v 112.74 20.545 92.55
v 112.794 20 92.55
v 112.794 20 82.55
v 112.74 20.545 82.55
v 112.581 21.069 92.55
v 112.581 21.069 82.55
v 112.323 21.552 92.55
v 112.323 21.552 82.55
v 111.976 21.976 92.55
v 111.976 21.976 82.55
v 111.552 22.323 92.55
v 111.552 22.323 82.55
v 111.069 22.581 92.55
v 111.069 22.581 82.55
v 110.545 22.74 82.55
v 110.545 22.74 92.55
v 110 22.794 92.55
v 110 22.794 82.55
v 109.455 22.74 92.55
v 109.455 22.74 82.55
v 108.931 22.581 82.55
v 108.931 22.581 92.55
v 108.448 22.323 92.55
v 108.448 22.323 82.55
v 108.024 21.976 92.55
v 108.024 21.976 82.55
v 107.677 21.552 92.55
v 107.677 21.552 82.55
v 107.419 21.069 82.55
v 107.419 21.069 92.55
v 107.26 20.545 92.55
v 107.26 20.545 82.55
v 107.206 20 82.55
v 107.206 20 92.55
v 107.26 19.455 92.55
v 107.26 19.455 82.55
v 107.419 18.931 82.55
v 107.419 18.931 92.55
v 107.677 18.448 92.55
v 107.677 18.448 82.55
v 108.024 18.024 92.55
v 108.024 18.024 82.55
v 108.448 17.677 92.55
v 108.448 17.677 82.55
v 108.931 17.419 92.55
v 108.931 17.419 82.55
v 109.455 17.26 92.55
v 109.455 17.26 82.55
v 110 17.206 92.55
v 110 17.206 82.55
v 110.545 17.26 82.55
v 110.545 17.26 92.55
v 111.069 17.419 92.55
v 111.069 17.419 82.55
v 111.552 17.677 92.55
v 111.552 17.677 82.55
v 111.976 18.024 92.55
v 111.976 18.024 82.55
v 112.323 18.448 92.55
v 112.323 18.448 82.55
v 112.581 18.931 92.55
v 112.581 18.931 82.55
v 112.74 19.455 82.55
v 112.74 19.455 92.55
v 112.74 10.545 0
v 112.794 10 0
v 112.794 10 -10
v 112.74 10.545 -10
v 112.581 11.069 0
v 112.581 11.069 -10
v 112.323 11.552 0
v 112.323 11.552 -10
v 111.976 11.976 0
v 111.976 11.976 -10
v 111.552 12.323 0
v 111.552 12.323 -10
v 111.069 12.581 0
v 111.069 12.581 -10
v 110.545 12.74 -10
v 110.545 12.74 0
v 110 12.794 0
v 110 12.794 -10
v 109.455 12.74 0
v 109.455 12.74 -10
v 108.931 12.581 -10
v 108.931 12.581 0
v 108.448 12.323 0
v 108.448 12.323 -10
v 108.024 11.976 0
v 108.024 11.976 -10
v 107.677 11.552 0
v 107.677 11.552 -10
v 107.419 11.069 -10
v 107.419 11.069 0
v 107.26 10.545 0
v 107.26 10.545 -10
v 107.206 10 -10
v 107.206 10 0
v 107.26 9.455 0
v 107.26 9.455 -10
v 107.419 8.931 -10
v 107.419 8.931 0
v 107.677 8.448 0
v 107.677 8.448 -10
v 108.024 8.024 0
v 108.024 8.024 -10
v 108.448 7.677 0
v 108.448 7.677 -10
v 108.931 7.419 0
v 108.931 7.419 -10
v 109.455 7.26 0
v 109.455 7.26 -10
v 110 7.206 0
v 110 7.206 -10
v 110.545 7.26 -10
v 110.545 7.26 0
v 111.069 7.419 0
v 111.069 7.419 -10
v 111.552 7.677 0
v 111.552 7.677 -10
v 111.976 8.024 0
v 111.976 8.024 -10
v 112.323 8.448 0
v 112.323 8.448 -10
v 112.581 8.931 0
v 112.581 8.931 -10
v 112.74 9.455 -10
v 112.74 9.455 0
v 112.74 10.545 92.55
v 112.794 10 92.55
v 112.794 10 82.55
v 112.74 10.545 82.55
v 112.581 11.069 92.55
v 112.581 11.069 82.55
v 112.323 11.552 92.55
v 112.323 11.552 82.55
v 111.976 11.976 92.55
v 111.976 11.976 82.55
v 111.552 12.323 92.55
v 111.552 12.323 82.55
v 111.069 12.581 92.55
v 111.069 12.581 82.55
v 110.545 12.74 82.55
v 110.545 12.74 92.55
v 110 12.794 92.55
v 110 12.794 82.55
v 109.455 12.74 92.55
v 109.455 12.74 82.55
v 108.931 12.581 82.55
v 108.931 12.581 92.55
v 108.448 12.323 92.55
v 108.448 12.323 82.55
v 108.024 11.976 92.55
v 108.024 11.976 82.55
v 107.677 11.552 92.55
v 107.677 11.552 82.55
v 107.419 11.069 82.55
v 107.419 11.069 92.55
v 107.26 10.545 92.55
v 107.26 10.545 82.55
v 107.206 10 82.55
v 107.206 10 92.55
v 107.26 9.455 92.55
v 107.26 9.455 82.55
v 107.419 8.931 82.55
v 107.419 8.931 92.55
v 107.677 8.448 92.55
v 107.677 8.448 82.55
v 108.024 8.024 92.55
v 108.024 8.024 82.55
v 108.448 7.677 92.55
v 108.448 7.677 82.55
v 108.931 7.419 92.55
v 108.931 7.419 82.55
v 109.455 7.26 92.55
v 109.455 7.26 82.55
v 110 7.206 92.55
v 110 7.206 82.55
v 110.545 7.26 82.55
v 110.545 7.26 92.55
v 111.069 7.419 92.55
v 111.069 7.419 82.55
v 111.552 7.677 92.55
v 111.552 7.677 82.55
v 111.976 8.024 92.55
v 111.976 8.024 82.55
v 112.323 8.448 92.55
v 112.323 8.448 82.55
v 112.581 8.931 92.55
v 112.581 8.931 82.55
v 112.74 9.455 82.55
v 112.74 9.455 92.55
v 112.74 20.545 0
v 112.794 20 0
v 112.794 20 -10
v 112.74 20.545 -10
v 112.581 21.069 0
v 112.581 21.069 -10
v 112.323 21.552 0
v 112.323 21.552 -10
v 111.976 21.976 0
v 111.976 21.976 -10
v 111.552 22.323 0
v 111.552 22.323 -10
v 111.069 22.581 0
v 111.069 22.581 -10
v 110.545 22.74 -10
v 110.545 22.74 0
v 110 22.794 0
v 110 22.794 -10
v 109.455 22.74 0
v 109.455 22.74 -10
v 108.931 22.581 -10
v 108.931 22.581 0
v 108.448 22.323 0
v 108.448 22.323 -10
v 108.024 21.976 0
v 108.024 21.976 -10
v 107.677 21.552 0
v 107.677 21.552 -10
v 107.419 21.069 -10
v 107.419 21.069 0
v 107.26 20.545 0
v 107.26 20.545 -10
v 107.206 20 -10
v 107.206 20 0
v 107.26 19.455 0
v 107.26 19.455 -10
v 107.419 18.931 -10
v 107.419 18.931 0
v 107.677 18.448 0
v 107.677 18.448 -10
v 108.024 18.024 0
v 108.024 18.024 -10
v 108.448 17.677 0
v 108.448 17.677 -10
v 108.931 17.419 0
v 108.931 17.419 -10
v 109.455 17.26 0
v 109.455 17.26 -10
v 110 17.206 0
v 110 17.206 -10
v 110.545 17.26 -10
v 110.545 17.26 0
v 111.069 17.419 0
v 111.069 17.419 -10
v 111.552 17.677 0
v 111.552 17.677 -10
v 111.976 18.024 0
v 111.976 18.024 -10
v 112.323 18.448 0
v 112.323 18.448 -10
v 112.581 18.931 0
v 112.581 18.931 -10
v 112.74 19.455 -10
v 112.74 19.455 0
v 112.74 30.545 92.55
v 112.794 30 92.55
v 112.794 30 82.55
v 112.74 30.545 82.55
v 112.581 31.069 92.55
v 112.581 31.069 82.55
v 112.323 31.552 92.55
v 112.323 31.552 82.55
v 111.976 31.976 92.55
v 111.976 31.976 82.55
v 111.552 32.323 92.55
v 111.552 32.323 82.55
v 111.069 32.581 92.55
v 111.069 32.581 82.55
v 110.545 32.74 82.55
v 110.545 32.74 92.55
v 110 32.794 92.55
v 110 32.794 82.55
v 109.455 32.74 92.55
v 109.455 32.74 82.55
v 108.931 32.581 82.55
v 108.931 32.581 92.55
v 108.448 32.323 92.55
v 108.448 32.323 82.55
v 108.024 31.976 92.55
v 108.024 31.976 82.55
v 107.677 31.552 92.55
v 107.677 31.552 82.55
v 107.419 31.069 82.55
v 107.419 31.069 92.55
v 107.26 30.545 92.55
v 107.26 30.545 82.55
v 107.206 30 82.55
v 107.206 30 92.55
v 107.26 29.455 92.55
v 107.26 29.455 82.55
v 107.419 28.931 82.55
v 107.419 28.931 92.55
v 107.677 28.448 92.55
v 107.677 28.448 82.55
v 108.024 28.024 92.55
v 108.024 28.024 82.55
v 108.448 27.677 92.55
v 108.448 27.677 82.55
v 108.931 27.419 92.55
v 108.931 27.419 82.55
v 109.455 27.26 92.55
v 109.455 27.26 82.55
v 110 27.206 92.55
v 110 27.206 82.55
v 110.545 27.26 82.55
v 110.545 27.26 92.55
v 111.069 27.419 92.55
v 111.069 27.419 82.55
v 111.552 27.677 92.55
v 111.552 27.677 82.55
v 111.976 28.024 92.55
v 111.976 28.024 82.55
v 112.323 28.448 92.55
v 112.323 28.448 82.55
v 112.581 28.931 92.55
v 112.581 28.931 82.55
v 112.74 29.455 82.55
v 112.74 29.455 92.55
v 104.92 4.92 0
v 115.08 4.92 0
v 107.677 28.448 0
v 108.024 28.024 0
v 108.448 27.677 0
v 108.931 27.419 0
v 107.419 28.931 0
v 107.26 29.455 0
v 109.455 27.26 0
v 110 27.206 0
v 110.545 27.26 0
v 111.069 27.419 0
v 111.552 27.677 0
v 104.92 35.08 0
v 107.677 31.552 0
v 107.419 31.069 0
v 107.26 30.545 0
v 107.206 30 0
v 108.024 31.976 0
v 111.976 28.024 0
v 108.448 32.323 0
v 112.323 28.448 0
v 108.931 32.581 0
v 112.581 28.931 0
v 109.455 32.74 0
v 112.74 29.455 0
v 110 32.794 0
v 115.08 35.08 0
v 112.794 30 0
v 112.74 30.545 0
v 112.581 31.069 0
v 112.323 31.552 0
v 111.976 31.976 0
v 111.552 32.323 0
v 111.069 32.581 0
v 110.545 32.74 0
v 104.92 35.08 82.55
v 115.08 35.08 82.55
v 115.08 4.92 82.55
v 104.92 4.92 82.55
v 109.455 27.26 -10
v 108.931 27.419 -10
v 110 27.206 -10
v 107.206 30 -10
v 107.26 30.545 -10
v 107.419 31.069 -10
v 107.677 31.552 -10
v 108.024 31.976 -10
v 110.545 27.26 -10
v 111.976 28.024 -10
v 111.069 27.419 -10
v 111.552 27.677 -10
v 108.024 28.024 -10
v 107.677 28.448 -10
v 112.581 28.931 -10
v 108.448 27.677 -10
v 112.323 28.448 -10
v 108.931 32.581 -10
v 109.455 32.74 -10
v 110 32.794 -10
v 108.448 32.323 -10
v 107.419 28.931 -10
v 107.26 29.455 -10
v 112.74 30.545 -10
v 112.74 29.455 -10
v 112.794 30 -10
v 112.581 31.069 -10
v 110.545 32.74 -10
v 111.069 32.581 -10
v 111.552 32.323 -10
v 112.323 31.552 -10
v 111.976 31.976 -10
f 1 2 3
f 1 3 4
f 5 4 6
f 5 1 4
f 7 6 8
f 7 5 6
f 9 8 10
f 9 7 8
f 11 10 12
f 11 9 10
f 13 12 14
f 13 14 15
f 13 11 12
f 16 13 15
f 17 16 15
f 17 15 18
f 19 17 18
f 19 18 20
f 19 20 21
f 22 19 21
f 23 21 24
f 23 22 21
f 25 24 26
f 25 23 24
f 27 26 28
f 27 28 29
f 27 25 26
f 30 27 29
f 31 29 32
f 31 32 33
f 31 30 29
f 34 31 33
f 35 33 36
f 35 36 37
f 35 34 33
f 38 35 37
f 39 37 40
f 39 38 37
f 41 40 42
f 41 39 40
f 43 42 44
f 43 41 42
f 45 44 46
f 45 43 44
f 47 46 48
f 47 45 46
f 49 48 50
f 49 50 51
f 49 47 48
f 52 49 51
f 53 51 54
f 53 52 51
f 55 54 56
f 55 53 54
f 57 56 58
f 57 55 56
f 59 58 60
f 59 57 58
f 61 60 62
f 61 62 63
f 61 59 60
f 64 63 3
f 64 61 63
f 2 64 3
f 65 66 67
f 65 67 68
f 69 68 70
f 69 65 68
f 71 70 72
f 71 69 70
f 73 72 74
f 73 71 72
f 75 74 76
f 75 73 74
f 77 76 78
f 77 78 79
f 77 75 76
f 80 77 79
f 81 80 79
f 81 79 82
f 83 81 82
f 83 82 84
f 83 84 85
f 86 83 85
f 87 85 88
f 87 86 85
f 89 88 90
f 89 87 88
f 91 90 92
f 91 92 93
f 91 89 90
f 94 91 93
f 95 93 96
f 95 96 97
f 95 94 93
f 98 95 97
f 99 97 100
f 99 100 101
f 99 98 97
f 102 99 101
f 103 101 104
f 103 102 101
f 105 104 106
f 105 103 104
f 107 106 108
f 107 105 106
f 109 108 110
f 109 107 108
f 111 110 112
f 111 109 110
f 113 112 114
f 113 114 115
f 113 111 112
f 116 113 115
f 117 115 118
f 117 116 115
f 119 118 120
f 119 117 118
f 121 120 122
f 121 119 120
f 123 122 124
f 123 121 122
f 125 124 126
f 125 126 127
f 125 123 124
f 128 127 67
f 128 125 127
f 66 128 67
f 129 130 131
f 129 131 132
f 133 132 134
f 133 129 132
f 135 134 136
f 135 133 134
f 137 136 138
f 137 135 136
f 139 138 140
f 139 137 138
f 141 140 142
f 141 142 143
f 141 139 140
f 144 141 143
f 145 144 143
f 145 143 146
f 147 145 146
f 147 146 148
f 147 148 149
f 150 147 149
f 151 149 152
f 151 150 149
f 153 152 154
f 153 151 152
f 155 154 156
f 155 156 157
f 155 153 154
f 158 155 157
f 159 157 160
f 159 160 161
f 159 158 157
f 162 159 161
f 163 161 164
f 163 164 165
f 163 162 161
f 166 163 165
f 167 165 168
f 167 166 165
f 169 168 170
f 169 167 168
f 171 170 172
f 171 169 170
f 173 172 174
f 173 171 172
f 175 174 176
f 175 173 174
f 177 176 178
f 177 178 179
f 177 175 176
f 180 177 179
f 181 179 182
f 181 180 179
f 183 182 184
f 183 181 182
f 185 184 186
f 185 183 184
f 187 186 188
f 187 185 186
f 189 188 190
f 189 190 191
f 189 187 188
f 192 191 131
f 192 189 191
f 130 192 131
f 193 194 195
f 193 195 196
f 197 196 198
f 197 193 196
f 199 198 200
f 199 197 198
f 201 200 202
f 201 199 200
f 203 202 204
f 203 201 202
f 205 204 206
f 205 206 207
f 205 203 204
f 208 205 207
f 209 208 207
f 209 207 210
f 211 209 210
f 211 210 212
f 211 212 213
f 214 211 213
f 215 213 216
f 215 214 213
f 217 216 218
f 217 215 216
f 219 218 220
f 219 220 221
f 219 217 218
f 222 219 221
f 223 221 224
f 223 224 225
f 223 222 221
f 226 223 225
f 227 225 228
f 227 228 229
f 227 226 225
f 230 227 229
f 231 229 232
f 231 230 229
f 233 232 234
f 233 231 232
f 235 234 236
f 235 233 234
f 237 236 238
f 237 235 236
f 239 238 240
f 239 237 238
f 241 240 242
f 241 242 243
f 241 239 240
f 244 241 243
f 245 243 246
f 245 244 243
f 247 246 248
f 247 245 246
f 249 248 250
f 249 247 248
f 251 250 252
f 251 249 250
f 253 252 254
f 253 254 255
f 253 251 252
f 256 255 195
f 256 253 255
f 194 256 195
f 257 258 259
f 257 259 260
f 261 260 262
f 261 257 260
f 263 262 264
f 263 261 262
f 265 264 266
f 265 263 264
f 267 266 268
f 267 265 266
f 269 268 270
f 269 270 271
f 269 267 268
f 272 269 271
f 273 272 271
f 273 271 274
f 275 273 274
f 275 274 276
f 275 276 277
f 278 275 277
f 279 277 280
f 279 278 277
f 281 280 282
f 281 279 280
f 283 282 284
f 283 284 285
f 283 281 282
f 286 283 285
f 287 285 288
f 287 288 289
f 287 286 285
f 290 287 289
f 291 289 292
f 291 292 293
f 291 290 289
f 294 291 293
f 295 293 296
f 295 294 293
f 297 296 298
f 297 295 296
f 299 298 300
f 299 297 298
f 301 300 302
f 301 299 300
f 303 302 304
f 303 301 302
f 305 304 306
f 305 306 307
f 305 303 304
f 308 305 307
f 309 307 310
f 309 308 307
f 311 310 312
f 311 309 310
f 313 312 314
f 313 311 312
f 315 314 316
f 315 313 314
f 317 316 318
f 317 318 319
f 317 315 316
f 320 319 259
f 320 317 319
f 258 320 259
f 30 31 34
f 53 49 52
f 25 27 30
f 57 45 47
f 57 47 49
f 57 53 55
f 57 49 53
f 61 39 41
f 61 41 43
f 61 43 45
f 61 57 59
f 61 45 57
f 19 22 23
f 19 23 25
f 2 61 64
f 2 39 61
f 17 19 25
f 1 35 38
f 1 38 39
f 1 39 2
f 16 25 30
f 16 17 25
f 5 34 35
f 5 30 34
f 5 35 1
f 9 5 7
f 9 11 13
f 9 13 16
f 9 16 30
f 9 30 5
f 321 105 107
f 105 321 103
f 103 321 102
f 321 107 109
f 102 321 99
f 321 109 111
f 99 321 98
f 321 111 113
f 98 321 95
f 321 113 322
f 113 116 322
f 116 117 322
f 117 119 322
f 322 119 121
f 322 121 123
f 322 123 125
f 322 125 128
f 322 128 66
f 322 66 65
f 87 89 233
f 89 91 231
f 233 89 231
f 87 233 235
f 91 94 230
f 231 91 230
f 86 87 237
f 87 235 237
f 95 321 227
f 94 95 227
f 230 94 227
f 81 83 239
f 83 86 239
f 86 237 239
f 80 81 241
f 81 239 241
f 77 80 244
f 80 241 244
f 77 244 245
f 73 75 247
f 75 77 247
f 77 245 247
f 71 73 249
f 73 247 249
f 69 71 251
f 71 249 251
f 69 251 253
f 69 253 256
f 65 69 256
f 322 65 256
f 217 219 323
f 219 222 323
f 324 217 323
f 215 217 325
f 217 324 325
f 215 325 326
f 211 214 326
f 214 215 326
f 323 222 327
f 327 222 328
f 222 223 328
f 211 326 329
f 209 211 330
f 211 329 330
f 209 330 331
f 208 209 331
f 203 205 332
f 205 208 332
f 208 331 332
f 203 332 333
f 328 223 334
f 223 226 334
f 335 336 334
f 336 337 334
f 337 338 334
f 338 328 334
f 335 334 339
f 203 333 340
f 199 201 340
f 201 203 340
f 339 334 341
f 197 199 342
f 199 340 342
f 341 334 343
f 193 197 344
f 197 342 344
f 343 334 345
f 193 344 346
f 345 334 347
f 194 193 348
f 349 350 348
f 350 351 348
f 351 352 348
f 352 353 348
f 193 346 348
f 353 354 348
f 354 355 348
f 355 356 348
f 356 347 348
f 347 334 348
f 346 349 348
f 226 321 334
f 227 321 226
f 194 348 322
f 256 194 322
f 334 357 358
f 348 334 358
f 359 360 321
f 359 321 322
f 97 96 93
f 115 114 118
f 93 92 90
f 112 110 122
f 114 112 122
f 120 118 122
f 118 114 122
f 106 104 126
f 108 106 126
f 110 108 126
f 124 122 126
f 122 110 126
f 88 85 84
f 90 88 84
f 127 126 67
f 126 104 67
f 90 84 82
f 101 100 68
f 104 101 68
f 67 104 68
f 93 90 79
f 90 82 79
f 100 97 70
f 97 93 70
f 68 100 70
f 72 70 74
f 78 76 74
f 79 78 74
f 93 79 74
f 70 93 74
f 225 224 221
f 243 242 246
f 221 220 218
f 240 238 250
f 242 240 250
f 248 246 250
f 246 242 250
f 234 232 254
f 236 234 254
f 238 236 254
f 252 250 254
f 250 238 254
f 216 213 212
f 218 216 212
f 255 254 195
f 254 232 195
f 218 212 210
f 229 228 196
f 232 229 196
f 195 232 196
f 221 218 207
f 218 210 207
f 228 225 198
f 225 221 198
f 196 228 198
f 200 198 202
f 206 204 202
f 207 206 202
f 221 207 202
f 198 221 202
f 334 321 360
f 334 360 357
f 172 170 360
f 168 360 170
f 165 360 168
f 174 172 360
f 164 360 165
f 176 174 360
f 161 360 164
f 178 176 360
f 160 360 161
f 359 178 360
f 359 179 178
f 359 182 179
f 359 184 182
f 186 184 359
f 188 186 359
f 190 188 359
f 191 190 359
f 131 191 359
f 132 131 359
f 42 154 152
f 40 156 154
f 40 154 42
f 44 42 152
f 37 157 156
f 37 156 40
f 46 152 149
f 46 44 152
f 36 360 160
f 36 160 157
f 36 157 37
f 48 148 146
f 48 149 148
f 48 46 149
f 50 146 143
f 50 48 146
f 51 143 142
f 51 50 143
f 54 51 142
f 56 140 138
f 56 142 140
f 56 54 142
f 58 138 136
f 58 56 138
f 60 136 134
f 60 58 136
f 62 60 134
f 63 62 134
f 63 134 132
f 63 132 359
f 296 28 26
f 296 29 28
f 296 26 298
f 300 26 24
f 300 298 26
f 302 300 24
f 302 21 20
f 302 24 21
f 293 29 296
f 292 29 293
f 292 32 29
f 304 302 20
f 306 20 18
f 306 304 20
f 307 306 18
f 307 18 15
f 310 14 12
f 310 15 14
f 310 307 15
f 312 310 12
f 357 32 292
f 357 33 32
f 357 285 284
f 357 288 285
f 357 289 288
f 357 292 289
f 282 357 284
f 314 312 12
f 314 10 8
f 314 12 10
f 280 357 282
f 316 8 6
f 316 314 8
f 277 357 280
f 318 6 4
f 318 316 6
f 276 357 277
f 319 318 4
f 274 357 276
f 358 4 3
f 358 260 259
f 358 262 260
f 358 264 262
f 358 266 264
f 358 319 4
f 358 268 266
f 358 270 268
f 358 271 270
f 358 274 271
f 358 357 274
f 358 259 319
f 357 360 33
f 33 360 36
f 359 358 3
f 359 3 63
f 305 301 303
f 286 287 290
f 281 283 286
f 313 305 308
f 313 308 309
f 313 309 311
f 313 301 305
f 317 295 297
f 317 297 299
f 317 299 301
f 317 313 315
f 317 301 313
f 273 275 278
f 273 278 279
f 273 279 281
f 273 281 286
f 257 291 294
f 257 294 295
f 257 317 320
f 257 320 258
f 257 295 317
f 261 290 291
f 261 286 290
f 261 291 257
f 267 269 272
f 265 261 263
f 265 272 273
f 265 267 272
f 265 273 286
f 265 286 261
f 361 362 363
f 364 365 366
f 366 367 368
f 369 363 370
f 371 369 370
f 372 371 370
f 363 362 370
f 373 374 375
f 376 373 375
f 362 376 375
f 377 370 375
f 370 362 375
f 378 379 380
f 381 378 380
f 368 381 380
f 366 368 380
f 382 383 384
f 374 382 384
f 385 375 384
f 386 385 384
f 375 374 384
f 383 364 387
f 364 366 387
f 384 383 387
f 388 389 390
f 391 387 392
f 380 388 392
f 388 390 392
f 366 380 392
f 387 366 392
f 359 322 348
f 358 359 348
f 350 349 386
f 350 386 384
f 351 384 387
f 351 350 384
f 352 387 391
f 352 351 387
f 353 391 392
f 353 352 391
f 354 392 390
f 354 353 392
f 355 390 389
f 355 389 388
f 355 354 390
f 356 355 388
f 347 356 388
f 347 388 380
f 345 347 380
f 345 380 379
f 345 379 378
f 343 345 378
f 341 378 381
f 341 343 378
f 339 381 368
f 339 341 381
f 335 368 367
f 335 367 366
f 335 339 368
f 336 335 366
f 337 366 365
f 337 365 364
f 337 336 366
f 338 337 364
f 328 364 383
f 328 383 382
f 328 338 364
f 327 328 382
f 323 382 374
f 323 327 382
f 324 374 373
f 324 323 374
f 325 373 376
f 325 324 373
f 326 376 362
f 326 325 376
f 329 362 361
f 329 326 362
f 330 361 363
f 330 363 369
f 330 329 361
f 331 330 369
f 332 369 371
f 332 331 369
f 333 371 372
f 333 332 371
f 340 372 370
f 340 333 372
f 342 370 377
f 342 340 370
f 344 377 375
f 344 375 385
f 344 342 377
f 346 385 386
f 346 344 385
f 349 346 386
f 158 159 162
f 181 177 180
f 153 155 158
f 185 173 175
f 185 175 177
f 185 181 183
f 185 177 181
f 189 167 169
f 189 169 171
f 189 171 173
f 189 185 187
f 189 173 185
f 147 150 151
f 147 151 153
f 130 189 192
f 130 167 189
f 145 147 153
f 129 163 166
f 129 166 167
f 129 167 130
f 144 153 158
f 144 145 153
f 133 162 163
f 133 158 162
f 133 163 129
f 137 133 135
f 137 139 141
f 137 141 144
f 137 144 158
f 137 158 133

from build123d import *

# Parameters (mm, degrees)
SKETCH1_R             = 2.794
BOSS_EXTRUDE1_DEPTH   = 10
BOSS_EXTRUDE1_2_DEPTH = 10
BOSS_EXTRUDE1_3_DEPTH = 10
SKETCH2_W             = 10.16
SKETCH2_H             = 30.16
BOSS_EXTRUDE2_DEPTH   = 82.55
BOSS_EXTRUDE3_START   = 10
SKETCH3_R             = 2.794
BOSS_EXTRUDE3_DEPTH   = 10


with BuildPart() as part:
    # Sketch1 → Boss-Extrude1 (new body)
    with BuildSketch(Plane.XY):
        with Locations((110, 20)):
            Circle(SKETCH1_R)
    extrude(amount=-BOSS_EXTRUDE1_DEPTH)



with BuildPart() as body_2:
    # Sketch1 → Boss-Extrude1 2 (new body)
    with BuildSketch(Plane.XY):
        with Locations((110, 10)):
            Circle(SKETCH1_R)
    extrude(amount=-BOSS_EXTRUDE1_2_DEPTH)


with BuildPart() as body_3:
    # Sketch1 → Boss-Extrude1 3 (new body)
    with BuildSketch(Plane.XY):
        with Locations((110, 30)):
            Circle(SKETCH1_R)
    extrude(amount=-BOSS_EXTRUDE1_3_DEPTH)


with BuildPart() as part_1:
    add(part.part)

    add(body_2.part)  # Boss-Extrude2 merges body 2

    add(body_3.part)  # Boss-Extrude2 merges body 3
    # Sketch2 → Boss-Extrude2 (add)
    with BuildSketch(Plane.XY):
        with Locations((110, 20)):
            Rectangle(SKETCH2_W, SKETCH2_H)
    extrude(amount=BOSS_EXTRUDE2_DEPTH)

    # Sketch3 → Boss-Extrude3 (add)
    with BuildSketch(Plane.XY.offset(82.55).offset(BOSS_EXTRUDE3_START)):
        with Locations((110, 10)):
            Circle(SKETCH3_R)
        with Locations((110, 20)):
            Circle(SKETCH3_R)
        with Locations((110, 30)):
            Circle(SKETCH3_R)
    extrude(amount=-BOSS_EXTRUDE3_DEPTH)


solid = part_1.part
